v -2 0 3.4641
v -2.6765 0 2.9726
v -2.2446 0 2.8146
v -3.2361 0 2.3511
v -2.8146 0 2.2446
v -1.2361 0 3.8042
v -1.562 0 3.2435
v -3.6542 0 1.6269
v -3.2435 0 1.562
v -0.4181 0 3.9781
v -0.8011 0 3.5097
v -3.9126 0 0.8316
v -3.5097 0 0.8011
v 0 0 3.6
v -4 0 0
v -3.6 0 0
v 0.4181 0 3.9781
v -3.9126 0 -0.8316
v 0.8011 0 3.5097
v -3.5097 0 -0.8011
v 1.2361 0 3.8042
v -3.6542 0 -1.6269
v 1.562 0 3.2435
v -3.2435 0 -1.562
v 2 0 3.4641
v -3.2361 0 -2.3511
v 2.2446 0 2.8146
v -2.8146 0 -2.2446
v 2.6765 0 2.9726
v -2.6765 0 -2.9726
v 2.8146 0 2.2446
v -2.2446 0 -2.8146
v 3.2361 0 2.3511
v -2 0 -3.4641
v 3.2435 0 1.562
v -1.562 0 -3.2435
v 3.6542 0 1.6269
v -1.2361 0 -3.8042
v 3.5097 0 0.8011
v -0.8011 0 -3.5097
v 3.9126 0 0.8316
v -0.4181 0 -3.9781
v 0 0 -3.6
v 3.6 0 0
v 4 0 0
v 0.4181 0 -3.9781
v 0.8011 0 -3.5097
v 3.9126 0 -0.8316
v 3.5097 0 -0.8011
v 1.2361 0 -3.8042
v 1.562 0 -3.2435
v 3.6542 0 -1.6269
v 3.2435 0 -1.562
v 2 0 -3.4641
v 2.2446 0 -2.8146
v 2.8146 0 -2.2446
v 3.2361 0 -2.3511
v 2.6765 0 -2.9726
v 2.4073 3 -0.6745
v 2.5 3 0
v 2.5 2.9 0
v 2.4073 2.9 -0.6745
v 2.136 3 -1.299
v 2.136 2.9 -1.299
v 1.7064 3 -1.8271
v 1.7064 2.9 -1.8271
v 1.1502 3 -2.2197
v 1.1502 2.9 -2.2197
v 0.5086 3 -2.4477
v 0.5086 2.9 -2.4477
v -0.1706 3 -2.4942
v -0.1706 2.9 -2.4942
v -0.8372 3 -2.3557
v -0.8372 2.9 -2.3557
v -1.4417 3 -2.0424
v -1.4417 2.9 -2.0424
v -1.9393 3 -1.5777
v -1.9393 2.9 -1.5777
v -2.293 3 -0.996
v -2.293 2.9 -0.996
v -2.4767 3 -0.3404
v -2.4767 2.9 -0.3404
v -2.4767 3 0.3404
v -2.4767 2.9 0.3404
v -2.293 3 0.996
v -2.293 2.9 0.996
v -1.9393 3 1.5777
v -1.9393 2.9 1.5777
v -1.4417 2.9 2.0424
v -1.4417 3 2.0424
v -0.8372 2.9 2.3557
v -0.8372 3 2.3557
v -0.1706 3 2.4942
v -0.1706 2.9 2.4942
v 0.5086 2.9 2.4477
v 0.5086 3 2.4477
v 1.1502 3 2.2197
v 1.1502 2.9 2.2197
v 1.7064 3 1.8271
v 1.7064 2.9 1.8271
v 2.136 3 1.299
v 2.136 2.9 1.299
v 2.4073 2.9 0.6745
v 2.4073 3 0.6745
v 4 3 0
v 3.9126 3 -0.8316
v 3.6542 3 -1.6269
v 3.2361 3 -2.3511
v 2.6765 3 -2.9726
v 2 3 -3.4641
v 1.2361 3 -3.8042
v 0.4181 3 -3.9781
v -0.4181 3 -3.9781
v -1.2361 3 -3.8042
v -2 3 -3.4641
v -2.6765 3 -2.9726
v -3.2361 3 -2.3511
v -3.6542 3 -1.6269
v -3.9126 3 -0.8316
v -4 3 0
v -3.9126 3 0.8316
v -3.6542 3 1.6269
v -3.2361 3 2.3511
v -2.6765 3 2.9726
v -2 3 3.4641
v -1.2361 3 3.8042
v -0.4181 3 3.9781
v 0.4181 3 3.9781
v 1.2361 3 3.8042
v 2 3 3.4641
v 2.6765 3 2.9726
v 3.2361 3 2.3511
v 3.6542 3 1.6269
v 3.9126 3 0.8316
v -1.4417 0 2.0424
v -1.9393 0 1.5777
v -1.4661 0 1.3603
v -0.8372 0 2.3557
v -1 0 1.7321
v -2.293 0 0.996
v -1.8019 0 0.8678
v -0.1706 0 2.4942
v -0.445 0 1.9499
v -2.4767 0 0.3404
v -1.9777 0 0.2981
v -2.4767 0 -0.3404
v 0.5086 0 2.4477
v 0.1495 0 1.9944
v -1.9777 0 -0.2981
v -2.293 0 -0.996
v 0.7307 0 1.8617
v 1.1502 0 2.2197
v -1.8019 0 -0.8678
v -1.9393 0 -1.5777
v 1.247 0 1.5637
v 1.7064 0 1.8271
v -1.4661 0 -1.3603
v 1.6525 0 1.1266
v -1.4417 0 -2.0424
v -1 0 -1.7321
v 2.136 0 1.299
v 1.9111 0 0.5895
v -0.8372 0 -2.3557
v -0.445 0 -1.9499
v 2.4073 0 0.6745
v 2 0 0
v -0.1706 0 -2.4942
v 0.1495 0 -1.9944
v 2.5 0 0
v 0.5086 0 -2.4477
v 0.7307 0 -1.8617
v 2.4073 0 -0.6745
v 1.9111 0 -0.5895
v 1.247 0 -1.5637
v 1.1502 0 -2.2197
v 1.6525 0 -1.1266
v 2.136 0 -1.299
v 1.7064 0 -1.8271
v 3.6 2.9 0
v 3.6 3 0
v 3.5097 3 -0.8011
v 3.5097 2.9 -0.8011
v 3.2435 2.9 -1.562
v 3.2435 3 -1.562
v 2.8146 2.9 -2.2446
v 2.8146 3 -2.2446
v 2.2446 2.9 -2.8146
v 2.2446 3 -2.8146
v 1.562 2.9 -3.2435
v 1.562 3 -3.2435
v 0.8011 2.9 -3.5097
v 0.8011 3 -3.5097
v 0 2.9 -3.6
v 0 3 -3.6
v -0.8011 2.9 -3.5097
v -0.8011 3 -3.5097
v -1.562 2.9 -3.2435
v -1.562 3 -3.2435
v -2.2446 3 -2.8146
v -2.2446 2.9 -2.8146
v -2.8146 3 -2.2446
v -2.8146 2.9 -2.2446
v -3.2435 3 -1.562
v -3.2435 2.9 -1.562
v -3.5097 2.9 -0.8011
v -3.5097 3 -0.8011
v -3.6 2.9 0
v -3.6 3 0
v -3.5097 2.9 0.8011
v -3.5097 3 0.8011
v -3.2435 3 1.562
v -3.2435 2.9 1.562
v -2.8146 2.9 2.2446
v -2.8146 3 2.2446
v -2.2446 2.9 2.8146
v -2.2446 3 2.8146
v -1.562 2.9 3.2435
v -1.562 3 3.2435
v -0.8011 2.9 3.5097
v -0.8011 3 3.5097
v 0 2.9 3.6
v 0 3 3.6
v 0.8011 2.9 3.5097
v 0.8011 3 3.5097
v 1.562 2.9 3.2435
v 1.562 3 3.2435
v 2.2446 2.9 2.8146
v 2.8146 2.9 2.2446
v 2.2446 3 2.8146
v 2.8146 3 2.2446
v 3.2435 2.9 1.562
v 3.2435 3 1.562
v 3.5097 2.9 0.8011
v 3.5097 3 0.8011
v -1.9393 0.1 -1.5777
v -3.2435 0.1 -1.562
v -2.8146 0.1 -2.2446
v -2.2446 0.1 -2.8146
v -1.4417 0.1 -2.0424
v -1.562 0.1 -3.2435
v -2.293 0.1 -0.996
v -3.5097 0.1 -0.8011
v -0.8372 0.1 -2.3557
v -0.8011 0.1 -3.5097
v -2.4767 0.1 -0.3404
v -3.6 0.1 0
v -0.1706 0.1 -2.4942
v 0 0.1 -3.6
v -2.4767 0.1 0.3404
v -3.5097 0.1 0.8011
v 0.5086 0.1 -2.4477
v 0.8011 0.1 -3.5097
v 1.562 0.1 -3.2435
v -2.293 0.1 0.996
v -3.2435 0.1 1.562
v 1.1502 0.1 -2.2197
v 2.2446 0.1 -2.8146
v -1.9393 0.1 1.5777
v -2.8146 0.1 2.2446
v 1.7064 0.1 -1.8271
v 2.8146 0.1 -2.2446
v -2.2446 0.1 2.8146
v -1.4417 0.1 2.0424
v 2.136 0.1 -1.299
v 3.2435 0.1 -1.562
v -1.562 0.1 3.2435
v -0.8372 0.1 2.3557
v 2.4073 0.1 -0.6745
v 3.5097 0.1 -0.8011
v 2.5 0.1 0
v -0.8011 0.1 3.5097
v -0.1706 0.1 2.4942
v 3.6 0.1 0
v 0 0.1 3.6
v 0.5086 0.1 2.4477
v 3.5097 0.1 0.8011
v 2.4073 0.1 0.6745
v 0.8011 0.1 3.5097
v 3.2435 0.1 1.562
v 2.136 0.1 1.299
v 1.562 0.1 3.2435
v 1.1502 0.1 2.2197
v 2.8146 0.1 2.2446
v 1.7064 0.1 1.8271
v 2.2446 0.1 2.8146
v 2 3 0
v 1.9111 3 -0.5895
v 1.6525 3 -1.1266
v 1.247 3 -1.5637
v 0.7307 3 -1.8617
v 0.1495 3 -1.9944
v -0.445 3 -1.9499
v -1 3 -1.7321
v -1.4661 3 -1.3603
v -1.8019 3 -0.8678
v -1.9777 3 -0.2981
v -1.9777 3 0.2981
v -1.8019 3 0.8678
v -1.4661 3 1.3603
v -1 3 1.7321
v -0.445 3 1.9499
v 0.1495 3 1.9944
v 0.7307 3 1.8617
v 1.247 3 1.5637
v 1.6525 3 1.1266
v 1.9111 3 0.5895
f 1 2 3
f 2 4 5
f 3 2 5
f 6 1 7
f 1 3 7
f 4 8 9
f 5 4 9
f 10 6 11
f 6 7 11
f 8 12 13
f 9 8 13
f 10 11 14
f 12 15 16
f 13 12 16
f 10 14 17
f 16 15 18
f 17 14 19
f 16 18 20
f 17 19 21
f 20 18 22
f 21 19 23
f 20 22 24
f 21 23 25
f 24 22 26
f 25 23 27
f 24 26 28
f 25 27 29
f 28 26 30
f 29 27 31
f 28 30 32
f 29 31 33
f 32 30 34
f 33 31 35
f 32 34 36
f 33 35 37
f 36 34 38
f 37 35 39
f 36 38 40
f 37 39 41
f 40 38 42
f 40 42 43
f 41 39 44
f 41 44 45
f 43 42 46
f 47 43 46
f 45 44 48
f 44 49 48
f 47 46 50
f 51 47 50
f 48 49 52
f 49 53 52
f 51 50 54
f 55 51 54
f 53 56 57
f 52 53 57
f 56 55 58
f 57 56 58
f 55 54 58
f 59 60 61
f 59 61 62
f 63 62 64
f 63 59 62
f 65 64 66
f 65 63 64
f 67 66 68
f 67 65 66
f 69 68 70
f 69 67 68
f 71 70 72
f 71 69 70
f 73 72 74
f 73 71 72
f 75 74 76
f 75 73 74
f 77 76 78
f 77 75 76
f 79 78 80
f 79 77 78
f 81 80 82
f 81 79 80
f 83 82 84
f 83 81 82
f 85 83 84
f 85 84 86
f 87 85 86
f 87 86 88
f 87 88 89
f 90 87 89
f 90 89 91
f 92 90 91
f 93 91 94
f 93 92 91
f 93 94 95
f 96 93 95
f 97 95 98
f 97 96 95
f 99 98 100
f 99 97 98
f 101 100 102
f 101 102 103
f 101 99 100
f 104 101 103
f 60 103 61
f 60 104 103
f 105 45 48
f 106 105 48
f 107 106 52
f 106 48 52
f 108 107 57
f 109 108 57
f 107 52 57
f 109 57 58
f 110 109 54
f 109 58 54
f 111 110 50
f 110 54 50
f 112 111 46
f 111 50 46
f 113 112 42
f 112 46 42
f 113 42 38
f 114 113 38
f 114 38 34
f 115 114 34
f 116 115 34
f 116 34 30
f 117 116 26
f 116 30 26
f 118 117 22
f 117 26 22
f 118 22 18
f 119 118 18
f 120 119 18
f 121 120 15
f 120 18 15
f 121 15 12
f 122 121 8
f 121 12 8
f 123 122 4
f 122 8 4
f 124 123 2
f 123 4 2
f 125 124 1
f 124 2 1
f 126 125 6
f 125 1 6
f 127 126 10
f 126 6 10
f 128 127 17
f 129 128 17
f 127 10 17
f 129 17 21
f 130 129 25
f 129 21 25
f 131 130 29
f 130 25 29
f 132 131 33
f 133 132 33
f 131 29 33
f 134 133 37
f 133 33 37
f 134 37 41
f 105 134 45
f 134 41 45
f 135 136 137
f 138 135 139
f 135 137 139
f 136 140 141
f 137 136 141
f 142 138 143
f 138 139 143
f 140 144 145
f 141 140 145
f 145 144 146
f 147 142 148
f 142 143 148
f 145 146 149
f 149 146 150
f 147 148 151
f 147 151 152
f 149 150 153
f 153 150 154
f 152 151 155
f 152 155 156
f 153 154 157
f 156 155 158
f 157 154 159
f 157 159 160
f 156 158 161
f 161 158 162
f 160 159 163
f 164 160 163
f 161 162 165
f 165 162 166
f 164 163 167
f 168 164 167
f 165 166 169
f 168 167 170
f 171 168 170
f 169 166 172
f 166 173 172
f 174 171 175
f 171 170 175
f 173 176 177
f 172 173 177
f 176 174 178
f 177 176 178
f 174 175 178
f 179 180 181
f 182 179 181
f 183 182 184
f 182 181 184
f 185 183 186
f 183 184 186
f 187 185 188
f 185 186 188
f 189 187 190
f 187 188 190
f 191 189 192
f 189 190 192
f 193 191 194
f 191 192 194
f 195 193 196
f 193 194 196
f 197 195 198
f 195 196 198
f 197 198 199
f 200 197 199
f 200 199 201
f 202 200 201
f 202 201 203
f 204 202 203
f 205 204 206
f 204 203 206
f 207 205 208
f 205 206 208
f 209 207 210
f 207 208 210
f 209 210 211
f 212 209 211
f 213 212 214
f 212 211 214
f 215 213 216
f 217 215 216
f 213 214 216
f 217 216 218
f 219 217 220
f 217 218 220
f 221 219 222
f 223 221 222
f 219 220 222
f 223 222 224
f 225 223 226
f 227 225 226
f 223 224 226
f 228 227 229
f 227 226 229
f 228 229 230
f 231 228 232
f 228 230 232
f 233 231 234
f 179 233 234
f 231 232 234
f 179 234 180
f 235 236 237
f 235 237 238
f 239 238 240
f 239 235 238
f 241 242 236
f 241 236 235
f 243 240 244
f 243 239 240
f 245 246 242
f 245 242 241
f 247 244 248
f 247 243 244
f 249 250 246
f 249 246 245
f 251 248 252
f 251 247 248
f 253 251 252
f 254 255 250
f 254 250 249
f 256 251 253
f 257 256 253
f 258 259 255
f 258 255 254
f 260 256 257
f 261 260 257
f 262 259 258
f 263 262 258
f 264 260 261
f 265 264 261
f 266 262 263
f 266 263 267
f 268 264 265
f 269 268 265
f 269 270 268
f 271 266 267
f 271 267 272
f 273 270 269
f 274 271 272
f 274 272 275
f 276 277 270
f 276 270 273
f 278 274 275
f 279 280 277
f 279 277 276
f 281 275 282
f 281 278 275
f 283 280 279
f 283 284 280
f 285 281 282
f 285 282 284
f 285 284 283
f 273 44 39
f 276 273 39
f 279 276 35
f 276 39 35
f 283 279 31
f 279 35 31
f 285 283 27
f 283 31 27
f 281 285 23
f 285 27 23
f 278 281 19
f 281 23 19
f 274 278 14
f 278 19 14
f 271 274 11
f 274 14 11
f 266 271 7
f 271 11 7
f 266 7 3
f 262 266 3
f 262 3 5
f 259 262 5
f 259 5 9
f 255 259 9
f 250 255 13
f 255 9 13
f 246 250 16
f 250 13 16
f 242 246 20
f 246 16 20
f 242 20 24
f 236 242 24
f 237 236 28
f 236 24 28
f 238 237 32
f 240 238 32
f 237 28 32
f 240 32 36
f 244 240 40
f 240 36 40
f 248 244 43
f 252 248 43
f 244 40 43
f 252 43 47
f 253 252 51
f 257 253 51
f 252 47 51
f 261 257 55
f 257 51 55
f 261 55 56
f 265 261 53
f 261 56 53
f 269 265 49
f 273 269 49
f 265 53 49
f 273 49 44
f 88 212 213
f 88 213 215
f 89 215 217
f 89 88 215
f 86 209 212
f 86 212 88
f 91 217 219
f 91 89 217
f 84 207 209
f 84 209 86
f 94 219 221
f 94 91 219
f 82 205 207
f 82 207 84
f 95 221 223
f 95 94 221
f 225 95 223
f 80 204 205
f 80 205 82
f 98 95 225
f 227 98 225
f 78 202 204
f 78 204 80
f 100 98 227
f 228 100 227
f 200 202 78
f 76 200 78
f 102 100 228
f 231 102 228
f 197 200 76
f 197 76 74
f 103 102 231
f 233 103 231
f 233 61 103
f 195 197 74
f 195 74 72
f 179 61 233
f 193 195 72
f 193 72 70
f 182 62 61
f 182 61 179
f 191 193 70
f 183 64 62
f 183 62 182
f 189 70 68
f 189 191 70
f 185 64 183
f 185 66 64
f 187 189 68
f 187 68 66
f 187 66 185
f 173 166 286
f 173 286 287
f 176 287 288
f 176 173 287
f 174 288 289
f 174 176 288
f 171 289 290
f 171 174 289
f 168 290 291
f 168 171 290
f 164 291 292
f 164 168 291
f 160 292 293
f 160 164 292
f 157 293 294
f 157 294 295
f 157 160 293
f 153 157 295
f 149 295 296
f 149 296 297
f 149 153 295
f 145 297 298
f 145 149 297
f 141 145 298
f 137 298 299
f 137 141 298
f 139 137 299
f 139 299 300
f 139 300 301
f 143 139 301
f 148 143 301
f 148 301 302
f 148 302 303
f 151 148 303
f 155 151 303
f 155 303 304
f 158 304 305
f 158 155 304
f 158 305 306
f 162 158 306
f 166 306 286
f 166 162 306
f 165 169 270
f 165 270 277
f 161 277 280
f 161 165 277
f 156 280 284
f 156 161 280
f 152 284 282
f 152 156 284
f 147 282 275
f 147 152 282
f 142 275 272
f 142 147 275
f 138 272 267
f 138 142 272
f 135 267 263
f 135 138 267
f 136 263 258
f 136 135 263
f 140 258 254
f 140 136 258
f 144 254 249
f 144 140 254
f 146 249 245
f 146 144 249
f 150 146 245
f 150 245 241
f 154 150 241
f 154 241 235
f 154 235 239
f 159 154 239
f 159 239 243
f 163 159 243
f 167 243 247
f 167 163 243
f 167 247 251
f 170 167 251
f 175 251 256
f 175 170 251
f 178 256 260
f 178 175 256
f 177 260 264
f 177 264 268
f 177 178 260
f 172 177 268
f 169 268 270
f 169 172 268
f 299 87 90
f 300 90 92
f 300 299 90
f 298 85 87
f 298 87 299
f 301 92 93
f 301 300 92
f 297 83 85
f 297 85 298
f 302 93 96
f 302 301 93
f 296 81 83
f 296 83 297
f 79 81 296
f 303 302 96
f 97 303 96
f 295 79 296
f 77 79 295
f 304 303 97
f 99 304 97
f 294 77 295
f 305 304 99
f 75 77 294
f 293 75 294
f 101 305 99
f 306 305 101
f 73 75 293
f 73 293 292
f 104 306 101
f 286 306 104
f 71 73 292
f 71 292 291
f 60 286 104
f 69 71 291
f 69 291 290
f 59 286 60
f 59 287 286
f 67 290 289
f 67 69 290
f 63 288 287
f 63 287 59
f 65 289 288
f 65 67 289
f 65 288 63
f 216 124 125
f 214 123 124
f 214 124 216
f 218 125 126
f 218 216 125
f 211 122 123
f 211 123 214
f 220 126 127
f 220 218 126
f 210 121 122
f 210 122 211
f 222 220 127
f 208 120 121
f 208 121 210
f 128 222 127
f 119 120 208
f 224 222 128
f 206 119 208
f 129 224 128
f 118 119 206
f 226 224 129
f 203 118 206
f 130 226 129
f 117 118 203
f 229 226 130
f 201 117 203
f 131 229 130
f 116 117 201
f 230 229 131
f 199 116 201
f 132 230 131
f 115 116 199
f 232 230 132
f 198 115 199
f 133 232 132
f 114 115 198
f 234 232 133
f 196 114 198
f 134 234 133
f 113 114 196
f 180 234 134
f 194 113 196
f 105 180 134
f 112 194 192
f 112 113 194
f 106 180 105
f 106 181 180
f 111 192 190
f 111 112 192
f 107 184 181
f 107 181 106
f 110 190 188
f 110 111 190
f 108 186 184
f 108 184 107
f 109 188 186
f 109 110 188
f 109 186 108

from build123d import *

# Parameters (mm, degrees)
SKETCH_1_R          = 4
SKETCH_1_R_2        = 2
EXTRUDE_1_DEPTH     = 3
SKETCH_2_R          = 3.6
SKETCH_2_R_2        = 2.5
CUT_EXTRUDE_1_DEPTH = 0.1
SKETCH_3_R          = 3.6
SKETCH_3_R_2        = 2.5
CUT_EXTRUDE_2_DEPTH = 0.1


with BuildPart() as part:
    # Эскиз1 → Бобышка-Вытянуть1 (new body)
    with BuildSketch(Plane(origin=(0, 0, 0), x_dir=(1, 0, 0), z_dir=(0, 1, 0))):
        Circle(SKETCH_1_R)
        Circle(SKETCH_1_R_2, mode=Mode.SUBTRACT)
    extrude(amount=EXTRUDE_1_DEPTH)

    # Эскиз2 → Вырез-Вытянуть1 (cut)
    with BuildSketch(Plane(origin=(0, 3, 0), x_dir=(1, 0, 0), z_dir=(0, 1, 0))):
        Circle(SKETCH_2_R)
        Circle(SKETCH_2_R_2, mode=Mode.SUBTRACT)
    extrude(amount=-CUT_EXTRUDE_1_DEPTH, mode=Mode.SUBTRACT)

    # Эскиз3 → Вырез-Вытянуть2 (cut)
    with BuildSketch(Plane.XZ):
        Circle(SKETCH_3_R)
        Circle(SKETCH_3_R_2, mode=Mode.SUBTRACT)
    extrude(amount=-CUT_EXTRUDE_2_DEPTH, mode=Mode.SUBTRACT)


solid = part.part
